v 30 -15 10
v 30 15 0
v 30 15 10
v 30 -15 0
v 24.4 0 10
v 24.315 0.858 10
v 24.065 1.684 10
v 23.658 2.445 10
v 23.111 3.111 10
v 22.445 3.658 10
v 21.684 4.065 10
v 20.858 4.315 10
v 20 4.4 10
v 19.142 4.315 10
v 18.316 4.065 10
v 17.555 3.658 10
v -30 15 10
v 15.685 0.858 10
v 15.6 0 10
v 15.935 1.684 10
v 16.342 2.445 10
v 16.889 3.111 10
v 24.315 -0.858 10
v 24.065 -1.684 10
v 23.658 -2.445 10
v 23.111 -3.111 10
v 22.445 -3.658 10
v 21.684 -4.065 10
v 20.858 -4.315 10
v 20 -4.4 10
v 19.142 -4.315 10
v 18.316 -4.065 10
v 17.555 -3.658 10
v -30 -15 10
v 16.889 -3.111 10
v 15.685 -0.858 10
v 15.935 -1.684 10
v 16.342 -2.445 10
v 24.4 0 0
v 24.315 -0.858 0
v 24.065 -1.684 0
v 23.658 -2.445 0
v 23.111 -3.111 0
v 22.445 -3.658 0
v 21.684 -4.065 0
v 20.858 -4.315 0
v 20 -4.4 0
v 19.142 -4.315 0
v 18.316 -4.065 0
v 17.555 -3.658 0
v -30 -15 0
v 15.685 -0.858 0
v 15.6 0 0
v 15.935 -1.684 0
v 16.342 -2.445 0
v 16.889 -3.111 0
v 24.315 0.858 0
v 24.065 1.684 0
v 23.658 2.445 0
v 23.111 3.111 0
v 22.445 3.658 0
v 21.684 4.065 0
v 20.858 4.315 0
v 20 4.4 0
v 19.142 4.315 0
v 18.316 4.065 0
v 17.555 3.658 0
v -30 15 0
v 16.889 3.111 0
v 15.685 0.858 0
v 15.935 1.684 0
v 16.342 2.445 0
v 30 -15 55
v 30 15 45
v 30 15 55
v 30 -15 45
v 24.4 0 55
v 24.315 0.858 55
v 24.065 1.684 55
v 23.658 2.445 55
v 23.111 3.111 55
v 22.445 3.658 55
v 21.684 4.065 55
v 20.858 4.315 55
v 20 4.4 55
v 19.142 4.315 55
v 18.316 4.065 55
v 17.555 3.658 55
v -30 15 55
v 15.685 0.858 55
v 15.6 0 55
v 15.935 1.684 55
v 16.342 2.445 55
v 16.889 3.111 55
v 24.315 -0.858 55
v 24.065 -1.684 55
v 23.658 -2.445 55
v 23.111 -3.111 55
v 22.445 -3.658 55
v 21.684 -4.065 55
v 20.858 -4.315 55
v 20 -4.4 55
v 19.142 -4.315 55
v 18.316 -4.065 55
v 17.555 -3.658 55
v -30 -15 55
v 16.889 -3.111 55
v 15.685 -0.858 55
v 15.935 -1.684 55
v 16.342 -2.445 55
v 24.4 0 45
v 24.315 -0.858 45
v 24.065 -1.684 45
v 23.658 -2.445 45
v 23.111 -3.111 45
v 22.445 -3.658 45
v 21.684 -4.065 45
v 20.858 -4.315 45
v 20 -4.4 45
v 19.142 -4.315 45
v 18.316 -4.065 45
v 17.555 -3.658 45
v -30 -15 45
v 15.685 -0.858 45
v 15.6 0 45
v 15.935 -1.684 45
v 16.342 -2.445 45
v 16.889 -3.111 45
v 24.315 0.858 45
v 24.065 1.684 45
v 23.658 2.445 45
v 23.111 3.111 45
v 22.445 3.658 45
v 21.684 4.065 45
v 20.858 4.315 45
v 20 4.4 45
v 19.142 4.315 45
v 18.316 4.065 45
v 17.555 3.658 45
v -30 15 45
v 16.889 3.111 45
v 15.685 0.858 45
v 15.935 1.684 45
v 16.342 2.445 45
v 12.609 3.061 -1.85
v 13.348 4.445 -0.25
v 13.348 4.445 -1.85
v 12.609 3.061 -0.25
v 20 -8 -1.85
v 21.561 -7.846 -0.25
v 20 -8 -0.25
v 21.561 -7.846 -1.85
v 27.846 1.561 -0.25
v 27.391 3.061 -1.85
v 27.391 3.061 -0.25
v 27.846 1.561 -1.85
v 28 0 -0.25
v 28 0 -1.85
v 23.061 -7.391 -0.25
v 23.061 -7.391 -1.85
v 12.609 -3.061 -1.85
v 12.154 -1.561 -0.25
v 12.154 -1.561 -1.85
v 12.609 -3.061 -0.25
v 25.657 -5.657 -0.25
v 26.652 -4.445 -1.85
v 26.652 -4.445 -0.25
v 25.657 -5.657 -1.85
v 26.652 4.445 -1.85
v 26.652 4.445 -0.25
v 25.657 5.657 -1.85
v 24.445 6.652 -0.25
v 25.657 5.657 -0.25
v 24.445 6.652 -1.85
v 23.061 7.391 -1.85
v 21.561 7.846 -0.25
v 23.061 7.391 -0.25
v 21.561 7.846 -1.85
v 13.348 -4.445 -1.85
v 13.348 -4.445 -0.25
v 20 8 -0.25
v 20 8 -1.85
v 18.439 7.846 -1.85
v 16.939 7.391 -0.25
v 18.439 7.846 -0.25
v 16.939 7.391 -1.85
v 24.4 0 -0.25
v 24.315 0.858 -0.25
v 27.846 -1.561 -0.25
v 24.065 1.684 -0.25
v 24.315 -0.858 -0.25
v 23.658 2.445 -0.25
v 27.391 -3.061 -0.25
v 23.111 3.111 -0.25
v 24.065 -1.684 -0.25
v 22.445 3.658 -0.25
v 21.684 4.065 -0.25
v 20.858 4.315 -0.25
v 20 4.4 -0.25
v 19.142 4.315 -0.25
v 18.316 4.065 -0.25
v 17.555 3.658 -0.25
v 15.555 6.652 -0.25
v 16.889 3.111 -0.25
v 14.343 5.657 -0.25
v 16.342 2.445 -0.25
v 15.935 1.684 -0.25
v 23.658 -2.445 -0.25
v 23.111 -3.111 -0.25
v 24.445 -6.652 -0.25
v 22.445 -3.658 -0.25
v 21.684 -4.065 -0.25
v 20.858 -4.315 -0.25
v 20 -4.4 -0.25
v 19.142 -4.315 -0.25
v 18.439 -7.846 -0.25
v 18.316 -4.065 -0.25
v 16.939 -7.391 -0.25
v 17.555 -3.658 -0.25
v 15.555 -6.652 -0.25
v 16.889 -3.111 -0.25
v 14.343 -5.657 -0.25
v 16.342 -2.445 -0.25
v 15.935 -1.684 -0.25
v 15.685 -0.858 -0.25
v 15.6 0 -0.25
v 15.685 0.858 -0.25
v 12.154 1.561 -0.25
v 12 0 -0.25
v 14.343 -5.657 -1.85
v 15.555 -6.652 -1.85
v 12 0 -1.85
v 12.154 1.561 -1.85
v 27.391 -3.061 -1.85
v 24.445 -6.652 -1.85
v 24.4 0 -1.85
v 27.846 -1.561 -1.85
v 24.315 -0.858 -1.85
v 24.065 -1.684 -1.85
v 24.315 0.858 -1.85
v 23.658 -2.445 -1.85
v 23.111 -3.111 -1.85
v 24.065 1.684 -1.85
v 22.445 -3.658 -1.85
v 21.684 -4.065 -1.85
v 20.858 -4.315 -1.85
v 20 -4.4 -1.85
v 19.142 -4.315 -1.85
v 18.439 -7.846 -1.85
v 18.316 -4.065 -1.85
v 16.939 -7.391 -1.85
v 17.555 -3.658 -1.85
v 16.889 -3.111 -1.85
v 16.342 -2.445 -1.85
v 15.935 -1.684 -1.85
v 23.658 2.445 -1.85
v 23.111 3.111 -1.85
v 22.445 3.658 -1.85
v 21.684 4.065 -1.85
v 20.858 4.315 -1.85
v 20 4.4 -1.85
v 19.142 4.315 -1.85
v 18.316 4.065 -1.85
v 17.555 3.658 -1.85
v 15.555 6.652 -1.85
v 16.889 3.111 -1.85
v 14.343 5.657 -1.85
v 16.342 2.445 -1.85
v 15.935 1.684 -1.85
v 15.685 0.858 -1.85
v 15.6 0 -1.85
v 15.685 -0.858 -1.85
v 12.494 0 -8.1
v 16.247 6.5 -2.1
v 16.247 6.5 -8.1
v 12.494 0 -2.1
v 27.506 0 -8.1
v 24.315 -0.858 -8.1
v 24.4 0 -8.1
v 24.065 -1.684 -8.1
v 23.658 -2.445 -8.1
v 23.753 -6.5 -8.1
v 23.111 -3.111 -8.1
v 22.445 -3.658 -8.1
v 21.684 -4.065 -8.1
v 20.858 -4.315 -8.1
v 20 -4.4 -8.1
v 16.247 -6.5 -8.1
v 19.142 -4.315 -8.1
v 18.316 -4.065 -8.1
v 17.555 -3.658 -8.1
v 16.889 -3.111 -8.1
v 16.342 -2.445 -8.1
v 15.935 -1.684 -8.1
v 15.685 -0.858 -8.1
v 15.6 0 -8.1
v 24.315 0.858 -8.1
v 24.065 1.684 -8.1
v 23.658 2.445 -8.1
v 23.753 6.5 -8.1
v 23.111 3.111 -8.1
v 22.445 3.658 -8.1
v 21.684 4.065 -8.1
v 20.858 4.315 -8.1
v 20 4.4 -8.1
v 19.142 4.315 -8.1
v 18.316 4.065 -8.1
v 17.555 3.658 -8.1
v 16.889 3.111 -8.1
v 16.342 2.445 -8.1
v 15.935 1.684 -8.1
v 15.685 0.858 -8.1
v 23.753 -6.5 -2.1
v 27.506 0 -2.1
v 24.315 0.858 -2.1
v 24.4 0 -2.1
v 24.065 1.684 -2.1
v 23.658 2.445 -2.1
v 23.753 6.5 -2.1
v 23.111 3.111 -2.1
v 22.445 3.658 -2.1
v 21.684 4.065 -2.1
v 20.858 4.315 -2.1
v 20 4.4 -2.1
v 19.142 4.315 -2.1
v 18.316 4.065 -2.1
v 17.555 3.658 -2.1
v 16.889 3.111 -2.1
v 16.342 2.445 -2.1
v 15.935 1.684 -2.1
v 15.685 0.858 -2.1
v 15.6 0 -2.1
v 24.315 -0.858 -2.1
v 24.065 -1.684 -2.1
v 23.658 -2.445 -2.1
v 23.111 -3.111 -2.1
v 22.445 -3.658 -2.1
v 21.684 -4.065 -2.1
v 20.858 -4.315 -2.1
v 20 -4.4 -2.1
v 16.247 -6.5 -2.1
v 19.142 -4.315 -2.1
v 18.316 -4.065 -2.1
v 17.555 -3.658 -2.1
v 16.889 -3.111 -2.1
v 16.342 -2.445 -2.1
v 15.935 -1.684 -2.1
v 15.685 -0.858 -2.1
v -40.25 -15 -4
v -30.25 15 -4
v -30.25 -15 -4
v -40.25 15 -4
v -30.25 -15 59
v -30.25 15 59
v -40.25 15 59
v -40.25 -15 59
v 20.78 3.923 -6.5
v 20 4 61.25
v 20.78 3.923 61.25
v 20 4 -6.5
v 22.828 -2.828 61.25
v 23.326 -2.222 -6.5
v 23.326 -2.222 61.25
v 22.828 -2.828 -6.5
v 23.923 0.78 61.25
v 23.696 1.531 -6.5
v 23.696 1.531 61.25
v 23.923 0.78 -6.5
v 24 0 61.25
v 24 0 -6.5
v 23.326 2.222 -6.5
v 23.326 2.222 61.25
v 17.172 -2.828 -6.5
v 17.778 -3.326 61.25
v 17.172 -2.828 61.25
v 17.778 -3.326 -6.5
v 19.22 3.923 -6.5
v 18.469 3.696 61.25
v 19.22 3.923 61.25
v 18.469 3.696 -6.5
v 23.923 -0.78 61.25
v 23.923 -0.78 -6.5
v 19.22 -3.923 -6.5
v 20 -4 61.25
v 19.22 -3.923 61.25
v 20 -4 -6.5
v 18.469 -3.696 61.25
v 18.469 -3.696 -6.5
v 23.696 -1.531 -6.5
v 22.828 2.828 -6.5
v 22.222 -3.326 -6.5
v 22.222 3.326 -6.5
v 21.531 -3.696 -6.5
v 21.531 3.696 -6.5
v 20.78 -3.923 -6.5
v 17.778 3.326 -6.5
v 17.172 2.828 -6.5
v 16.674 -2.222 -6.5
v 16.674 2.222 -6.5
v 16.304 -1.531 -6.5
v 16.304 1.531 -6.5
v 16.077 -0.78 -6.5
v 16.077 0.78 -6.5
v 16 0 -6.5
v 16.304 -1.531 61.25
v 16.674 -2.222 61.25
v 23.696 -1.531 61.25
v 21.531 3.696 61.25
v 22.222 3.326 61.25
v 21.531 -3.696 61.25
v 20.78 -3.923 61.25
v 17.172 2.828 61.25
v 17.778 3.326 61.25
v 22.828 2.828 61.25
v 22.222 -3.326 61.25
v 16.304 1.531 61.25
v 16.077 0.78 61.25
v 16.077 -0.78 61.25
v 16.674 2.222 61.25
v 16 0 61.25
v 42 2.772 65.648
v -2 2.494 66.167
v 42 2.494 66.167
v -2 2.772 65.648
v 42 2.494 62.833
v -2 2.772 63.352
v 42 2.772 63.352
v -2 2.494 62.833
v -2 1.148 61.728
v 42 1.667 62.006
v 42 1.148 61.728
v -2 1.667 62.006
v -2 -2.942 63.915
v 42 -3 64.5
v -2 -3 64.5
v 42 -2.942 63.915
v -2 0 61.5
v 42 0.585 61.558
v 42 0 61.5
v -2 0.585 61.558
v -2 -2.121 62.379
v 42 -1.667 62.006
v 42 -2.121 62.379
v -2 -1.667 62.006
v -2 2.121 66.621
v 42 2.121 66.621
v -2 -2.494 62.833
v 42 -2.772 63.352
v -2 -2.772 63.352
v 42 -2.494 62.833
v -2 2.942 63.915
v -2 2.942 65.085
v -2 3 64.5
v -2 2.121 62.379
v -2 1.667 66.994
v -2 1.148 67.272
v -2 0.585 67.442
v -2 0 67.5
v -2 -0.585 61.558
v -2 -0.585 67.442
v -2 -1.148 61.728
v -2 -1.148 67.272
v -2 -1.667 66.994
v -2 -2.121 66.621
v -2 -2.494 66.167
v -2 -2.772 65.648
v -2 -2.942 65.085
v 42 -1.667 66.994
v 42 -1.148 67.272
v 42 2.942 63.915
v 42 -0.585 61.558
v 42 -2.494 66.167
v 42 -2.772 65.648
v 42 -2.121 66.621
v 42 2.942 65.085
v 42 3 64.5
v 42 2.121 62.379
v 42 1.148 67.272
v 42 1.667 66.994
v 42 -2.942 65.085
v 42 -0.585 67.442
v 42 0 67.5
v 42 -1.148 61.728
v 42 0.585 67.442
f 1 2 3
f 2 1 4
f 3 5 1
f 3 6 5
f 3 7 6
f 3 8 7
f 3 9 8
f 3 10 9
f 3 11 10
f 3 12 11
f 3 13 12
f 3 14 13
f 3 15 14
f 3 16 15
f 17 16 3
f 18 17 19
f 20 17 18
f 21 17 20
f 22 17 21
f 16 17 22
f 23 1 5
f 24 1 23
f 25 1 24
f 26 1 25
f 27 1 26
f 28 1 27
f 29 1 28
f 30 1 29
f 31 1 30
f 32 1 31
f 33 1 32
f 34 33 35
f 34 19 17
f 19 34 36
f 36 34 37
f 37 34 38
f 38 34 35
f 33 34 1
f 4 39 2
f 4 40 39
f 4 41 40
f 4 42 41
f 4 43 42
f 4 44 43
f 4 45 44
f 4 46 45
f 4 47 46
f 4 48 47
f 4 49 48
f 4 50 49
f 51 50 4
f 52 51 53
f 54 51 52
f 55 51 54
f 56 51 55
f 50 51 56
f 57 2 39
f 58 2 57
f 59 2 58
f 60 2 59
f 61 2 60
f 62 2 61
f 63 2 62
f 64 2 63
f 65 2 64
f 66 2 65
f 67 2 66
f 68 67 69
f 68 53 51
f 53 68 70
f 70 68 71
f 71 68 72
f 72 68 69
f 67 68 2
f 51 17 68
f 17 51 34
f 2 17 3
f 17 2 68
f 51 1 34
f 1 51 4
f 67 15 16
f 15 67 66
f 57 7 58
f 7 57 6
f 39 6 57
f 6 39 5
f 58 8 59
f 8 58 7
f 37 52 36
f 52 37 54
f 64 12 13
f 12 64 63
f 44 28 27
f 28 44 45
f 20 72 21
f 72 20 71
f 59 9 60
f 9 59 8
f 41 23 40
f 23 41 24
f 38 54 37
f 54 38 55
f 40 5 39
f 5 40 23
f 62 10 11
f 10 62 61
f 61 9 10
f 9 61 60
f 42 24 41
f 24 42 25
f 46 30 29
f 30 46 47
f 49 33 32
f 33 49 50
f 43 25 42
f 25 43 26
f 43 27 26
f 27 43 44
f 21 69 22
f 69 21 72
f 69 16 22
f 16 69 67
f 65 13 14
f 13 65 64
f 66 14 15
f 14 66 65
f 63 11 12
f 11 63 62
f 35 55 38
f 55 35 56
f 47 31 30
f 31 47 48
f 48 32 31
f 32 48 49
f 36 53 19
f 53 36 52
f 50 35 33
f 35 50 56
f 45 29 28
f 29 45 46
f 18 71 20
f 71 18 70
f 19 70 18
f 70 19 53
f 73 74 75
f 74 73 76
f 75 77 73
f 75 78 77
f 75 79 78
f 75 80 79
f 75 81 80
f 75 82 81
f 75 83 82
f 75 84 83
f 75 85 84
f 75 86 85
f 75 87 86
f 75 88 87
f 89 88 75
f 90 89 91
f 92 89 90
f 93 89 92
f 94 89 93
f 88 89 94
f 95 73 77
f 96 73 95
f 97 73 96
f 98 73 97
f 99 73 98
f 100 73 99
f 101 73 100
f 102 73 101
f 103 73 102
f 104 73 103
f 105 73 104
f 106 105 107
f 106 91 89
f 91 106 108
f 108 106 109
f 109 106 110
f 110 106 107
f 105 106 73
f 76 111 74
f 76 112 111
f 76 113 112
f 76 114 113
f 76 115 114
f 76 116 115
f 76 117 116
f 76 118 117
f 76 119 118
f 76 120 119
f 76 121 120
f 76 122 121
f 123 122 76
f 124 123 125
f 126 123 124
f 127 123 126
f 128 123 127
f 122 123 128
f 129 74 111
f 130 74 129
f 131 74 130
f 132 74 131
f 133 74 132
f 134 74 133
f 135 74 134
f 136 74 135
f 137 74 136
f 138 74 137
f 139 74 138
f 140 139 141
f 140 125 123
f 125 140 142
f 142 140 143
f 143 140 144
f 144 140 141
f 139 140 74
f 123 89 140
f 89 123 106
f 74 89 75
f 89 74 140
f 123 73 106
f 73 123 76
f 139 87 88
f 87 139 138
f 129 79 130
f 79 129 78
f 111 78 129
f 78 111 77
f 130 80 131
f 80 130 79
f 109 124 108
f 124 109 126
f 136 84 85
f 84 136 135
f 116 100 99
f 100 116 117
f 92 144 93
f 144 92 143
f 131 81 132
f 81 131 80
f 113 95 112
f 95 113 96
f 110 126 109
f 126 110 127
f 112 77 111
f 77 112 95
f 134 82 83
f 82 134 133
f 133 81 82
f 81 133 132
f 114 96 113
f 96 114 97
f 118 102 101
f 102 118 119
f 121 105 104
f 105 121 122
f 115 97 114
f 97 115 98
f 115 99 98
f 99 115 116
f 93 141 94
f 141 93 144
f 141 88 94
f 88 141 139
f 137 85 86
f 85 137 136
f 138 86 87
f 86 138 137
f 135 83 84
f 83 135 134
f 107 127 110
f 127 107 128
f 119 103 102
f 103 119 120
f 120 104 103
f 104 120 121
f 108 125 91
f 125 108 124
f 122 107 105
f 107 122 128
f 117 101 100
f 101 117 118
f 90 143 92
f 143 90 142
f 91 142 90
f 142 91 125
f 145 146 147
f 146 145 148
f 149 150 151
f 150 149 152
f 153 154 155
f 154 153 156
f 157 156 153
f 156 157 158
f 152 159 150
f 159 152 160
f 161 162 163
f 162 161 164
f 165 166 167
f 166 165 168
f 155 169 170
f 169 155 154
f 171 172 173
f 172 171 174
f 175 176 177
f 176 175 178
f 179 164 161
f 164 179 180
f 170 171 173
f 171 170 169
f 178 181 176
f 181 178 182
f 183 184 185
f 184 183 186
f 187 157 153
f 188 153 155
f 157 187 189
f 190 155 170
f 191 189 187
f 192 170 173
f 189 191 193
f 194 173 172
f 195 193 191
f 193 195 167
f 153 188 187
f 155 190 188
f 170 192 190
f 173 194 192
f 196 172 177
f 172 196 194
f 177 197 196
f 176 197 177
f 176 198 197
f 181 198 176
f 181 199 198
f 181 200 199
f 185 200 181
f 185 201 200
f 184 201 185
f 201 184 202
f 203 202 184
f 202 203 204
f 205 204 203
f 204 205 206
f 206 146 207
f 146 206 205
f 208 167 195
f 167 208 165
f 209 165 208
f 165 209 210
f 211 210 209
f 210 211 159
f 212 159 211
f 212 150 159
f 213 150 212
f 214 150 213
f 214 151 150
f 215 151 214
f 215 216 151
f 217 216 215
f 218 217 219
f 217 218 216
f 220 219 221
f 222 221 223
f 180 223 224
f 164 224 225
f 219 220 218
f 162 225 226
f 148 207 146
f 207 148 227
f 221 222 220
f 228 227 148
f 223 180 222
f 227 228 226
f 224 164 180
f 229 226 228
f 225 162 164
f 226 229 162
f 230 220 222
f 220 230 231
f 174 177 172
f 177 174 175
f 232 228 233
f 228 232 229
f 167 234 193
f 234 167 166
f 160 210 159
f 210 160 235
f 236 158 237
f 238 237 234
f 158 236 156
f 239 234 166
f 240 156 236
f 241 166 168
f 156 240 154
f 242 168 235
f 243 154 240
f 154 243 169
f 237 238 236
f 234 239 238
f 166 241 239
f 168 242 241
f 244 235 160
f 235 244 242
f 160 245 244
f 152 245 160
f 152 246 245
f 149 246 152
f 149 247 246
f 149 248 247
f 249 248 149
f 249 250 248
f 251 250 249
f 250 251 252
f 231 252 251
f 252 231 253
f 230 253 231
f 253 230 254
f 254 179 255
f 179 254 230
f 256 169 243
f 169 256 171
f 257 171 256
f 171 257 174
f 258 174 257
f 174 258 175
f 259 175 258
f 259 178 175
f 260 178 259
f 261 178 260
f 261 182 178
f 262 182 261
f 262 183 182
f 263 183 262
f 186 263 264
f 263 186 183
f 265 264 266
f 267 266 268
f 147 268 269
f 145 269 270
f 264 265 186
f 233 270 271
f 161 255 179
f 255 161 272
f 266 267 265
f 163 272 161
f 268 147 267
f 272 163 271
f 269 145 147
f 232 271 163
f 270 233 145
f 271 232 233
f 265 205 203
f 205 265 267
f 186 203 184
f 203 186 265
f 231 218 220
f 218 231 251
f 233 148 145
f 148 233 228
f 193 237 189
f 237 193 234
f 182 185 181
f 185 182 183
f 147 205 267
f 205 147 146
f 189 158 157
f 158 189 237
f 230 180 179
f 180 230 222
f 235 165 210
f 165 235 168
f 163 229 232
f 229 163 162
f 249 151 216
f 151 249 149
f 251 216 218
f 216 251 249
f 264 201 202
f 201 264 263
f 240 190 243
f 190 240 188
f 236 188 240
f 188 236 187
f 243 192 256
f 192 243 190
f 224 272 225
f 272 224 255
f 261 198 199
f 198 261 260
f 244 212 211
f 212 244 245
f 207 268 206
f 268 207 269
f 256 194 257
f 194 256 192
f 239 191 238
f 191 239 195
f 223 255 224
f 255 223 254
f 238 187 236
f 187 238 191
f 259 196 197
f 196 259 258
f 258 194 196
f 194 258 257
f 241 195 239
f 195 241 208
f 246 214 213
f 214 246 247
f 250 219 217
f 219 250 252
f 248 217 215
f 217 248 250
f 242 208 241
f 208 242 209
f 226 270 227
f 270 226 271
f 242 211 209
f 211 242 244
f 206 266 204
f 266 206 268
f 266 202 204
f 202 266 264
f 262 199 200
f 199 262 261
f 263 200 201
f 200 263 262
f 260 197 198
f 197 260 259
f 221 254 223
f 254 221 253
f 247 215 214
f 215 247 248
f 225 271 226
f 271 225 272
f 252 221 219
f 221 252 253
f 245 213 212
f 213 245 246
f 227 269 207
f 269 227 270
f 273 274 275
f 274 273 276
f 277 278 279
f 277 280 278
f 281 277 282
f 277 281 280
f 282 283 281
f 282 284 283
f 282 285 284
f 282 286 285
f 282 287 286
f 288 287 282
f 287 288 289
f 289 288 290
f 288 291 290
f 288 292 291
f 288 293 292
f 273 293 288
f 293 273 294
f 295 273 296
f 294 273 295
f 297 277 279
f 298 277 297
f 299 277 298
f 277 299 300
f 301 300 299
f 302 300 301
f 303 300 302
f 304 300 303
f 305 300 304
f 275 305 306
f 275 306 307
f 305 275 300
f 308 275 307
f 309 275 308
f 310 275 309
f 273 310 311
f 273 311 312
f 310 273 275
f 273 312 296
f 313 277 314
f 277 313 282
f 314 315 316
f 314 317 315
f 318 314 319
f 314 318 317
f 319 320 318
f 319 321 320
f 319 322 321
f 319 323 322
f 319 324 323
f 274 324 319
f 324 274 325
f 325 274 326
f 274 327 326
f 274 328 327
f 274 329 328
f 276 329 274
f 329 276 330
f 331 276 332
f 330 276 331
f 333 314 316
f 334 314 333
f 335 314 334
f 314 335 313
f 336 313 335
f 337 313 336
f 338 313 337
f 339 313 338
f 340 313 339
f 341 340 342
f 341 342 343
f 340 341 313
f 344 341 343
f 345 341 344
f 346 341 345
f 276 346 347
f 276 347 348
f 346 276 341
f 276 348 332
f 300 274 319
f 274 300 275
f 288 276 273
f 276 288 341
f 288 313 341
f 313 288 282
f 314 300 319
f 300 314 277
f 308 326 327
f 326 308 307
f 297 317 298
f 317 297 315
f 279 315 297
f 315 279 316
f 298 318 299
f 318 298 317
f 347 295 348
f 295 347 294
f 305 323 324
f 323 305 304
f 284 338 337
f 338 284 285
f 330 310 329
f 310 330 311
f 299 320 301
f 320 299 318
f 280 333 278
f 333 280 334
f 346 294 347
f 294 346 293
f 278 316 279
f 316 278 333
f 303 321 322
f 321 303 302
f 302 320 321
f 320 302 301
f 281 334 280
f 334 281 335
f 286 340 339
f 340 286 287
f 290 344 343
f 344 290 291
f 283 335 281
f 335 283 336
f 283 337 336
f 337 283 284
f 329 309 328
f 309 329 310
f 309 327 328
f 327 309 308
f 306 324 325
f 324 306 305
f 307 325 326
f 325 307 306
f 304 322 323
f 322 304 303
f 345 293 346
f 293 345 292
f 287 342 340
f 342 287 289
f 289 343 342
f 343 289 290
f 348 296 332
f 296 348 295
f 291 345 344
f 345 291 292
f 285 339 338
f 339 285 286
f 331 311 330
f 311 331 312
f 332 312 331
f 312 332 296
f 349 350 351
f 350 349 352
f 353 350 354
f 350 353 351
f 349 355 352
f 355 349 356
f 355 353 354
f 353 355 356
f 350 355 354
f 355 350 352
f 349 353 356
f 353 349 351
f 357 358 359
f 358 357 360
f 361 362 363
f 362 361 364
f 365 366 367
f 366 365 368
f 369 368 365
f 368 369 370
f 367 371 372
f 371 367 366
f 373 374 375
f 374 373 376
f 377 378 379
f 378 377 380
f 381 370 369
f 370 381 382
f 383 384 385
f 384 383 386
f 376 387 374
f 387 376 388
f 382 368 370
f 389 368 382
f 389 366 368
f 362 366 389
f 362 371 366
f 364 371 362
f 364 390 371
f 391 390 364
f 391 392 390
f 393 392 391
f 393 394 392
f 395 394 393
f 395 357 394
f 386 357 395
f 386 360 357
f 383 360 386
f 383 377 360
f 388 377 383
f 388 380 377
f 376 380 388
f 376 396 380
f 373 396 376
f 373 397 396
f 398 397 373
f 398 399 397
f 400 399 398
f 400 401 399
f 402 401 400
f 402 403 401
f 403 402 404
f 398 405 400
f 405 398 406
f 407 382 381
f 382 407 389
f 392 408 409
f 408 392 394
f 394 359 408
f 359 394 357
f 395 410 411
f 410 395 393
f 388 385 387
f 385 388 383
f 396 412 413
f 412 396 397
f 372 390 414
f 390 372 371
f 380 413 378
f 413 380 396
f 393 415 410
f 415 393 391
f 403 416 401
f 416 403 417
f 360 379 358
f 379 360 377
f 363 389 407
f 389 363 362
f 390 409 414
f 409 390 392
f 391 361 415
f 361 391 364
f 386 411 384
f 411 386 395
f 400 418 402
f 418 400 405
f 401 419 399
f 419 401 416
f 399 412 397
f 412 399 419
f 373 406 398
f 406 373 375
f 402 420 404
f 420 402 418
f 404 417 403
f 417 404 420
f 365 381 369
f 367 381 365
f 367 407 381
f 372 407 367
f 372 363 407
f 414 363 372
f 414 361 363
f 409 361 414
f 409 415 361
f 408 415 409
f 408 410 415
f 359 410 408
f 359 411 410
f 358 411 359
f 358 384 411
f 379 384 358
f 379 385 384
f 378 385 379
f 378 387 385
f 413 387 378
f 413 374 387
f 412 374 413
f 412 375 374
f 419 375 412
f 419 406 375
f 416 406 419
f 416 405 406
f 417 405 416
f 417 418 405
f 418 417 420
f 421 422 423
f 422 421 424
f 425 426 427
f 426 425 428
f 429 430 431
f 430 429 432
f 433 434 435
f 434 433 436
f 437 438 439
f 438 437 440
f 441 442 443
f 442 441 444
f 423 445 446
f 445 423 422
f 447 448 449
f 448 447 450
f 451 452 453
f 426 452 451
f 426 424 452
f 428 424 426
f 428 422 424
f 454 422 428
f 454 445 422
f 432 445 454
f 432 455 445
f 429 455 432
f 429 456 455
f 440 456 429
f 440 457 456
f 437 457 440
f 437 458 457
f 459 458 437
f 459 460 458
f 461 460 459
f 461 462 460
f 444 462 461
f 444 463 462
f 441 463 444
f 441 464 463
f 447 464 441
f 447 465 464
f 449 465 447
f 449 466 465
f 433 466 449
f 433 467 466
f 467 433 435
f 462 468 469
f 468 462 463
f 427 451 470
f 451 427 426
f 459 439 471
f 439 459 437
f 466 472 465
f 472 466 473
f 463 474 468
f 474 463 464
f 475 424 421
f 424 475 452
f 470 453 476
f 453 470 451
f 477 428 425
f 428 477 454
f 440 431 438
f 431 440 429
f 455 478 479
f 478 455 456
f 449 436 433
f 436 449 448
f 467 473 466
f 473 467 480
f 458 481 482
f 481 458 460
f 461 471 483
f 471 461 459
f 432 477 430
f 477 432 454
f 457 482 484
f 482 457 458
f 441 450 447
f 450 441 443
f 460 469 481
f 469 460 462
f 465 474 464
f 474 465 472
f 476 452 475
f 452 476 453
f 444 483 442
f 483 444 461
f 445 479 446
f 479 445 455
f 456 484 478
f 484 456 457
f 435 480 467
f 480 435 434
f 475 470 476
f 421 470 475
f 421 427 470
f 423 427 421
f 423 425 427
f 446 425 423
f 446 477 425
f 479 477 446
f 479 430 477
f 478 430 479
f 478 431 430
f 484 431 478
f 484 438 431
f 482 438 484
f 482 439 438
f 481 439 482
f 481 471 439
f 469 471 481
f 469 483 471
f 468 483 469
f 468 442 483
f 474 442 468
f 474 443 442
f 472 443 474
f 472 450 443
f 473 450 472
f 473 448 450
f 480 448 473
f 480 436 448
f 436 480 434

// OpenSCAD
$fn = 32;

// ------------------------------------------------------------------------
// C clamp: throat 45 mm, screw d8
// Every part is its own module, assembly() places every instance.
// ------------------------------------------------------------------------

// --- part 1 ---
module clamp_arm() {
  difference() {
    translate([-30, -15, 0]) cube([60, 30, 10]);
    translate([20, 0, -1]) cylinder(h = 12, d = 8.8);
  }
}

// --- part 2 ---
module clamp_spine() {
  difference() {
    translate([-31.5, -15, 0]) cube([63, 30, 10]);
  }
}

// --- part 3 ---
module clamp_screw() {
  translate([0, 0, -33.875]) cylinder(h = 67.75, d = 8);
}

// --- part 4 ---
module clamp_washer() {
  difference() {
      translate([0, 0, 0]) cylinder(h = 1.6, d = 16);
      translate([0, 0, -1]) cylinder(h = 3.6, d = 8.8);
    }
}

// --- part 5 ---
module clamp_nut() {
  difference() {
    linear_extrude(height = 6) polygon(points = [[7.506, 0], [3.753, 6.5], [-3.753, 6.5], [-7.506, 0], [-3.753, -6.5], [3.753, -6.5]]);
    translate([0, 0, -1]) cylinder(h = 8, d = 8.8);
  }
}

// --- part 6 ---
module tommy_bar() {
  translate([0, 0, -22]) cylinder(h = 44, d = 6);
}

// --- assembly ---
module assembly() {
  color([0.80, 0.24, 0.20]) translate([0, 0, 0]) rotate([0, 0, 0]) clamp_arm();
  color([0.20, 0.45, 0.75]) translate([0, 0, 45]) rotate([0, 0, 0]) clamp_arm();
  color([0.25, 0.62, 0.32]) translate([-40.25, 0, 27.5]) rotate([0, 90, 0]) clamp_spine();
  color([0.92, 0.70, 0.18]) translate([20, 0, 27.375]) rotate([0, 0, 0]) clamp_screw();
  color([0.58, 0.35, 0.70]) translate([20, 0, -1.85]) rotate([0, 0, 0]) clamp_washer();
  color([0.16, 0.66, 0.66]) translate([20, 0, -8.1]) rotate([0, 0, 0]) clamp_nut();
  color([0.85, 0.48, 0.18]) translate([20, 0, 64.5]) rotate([0, 90, 0]) tommy_bar();
}

assembly();
